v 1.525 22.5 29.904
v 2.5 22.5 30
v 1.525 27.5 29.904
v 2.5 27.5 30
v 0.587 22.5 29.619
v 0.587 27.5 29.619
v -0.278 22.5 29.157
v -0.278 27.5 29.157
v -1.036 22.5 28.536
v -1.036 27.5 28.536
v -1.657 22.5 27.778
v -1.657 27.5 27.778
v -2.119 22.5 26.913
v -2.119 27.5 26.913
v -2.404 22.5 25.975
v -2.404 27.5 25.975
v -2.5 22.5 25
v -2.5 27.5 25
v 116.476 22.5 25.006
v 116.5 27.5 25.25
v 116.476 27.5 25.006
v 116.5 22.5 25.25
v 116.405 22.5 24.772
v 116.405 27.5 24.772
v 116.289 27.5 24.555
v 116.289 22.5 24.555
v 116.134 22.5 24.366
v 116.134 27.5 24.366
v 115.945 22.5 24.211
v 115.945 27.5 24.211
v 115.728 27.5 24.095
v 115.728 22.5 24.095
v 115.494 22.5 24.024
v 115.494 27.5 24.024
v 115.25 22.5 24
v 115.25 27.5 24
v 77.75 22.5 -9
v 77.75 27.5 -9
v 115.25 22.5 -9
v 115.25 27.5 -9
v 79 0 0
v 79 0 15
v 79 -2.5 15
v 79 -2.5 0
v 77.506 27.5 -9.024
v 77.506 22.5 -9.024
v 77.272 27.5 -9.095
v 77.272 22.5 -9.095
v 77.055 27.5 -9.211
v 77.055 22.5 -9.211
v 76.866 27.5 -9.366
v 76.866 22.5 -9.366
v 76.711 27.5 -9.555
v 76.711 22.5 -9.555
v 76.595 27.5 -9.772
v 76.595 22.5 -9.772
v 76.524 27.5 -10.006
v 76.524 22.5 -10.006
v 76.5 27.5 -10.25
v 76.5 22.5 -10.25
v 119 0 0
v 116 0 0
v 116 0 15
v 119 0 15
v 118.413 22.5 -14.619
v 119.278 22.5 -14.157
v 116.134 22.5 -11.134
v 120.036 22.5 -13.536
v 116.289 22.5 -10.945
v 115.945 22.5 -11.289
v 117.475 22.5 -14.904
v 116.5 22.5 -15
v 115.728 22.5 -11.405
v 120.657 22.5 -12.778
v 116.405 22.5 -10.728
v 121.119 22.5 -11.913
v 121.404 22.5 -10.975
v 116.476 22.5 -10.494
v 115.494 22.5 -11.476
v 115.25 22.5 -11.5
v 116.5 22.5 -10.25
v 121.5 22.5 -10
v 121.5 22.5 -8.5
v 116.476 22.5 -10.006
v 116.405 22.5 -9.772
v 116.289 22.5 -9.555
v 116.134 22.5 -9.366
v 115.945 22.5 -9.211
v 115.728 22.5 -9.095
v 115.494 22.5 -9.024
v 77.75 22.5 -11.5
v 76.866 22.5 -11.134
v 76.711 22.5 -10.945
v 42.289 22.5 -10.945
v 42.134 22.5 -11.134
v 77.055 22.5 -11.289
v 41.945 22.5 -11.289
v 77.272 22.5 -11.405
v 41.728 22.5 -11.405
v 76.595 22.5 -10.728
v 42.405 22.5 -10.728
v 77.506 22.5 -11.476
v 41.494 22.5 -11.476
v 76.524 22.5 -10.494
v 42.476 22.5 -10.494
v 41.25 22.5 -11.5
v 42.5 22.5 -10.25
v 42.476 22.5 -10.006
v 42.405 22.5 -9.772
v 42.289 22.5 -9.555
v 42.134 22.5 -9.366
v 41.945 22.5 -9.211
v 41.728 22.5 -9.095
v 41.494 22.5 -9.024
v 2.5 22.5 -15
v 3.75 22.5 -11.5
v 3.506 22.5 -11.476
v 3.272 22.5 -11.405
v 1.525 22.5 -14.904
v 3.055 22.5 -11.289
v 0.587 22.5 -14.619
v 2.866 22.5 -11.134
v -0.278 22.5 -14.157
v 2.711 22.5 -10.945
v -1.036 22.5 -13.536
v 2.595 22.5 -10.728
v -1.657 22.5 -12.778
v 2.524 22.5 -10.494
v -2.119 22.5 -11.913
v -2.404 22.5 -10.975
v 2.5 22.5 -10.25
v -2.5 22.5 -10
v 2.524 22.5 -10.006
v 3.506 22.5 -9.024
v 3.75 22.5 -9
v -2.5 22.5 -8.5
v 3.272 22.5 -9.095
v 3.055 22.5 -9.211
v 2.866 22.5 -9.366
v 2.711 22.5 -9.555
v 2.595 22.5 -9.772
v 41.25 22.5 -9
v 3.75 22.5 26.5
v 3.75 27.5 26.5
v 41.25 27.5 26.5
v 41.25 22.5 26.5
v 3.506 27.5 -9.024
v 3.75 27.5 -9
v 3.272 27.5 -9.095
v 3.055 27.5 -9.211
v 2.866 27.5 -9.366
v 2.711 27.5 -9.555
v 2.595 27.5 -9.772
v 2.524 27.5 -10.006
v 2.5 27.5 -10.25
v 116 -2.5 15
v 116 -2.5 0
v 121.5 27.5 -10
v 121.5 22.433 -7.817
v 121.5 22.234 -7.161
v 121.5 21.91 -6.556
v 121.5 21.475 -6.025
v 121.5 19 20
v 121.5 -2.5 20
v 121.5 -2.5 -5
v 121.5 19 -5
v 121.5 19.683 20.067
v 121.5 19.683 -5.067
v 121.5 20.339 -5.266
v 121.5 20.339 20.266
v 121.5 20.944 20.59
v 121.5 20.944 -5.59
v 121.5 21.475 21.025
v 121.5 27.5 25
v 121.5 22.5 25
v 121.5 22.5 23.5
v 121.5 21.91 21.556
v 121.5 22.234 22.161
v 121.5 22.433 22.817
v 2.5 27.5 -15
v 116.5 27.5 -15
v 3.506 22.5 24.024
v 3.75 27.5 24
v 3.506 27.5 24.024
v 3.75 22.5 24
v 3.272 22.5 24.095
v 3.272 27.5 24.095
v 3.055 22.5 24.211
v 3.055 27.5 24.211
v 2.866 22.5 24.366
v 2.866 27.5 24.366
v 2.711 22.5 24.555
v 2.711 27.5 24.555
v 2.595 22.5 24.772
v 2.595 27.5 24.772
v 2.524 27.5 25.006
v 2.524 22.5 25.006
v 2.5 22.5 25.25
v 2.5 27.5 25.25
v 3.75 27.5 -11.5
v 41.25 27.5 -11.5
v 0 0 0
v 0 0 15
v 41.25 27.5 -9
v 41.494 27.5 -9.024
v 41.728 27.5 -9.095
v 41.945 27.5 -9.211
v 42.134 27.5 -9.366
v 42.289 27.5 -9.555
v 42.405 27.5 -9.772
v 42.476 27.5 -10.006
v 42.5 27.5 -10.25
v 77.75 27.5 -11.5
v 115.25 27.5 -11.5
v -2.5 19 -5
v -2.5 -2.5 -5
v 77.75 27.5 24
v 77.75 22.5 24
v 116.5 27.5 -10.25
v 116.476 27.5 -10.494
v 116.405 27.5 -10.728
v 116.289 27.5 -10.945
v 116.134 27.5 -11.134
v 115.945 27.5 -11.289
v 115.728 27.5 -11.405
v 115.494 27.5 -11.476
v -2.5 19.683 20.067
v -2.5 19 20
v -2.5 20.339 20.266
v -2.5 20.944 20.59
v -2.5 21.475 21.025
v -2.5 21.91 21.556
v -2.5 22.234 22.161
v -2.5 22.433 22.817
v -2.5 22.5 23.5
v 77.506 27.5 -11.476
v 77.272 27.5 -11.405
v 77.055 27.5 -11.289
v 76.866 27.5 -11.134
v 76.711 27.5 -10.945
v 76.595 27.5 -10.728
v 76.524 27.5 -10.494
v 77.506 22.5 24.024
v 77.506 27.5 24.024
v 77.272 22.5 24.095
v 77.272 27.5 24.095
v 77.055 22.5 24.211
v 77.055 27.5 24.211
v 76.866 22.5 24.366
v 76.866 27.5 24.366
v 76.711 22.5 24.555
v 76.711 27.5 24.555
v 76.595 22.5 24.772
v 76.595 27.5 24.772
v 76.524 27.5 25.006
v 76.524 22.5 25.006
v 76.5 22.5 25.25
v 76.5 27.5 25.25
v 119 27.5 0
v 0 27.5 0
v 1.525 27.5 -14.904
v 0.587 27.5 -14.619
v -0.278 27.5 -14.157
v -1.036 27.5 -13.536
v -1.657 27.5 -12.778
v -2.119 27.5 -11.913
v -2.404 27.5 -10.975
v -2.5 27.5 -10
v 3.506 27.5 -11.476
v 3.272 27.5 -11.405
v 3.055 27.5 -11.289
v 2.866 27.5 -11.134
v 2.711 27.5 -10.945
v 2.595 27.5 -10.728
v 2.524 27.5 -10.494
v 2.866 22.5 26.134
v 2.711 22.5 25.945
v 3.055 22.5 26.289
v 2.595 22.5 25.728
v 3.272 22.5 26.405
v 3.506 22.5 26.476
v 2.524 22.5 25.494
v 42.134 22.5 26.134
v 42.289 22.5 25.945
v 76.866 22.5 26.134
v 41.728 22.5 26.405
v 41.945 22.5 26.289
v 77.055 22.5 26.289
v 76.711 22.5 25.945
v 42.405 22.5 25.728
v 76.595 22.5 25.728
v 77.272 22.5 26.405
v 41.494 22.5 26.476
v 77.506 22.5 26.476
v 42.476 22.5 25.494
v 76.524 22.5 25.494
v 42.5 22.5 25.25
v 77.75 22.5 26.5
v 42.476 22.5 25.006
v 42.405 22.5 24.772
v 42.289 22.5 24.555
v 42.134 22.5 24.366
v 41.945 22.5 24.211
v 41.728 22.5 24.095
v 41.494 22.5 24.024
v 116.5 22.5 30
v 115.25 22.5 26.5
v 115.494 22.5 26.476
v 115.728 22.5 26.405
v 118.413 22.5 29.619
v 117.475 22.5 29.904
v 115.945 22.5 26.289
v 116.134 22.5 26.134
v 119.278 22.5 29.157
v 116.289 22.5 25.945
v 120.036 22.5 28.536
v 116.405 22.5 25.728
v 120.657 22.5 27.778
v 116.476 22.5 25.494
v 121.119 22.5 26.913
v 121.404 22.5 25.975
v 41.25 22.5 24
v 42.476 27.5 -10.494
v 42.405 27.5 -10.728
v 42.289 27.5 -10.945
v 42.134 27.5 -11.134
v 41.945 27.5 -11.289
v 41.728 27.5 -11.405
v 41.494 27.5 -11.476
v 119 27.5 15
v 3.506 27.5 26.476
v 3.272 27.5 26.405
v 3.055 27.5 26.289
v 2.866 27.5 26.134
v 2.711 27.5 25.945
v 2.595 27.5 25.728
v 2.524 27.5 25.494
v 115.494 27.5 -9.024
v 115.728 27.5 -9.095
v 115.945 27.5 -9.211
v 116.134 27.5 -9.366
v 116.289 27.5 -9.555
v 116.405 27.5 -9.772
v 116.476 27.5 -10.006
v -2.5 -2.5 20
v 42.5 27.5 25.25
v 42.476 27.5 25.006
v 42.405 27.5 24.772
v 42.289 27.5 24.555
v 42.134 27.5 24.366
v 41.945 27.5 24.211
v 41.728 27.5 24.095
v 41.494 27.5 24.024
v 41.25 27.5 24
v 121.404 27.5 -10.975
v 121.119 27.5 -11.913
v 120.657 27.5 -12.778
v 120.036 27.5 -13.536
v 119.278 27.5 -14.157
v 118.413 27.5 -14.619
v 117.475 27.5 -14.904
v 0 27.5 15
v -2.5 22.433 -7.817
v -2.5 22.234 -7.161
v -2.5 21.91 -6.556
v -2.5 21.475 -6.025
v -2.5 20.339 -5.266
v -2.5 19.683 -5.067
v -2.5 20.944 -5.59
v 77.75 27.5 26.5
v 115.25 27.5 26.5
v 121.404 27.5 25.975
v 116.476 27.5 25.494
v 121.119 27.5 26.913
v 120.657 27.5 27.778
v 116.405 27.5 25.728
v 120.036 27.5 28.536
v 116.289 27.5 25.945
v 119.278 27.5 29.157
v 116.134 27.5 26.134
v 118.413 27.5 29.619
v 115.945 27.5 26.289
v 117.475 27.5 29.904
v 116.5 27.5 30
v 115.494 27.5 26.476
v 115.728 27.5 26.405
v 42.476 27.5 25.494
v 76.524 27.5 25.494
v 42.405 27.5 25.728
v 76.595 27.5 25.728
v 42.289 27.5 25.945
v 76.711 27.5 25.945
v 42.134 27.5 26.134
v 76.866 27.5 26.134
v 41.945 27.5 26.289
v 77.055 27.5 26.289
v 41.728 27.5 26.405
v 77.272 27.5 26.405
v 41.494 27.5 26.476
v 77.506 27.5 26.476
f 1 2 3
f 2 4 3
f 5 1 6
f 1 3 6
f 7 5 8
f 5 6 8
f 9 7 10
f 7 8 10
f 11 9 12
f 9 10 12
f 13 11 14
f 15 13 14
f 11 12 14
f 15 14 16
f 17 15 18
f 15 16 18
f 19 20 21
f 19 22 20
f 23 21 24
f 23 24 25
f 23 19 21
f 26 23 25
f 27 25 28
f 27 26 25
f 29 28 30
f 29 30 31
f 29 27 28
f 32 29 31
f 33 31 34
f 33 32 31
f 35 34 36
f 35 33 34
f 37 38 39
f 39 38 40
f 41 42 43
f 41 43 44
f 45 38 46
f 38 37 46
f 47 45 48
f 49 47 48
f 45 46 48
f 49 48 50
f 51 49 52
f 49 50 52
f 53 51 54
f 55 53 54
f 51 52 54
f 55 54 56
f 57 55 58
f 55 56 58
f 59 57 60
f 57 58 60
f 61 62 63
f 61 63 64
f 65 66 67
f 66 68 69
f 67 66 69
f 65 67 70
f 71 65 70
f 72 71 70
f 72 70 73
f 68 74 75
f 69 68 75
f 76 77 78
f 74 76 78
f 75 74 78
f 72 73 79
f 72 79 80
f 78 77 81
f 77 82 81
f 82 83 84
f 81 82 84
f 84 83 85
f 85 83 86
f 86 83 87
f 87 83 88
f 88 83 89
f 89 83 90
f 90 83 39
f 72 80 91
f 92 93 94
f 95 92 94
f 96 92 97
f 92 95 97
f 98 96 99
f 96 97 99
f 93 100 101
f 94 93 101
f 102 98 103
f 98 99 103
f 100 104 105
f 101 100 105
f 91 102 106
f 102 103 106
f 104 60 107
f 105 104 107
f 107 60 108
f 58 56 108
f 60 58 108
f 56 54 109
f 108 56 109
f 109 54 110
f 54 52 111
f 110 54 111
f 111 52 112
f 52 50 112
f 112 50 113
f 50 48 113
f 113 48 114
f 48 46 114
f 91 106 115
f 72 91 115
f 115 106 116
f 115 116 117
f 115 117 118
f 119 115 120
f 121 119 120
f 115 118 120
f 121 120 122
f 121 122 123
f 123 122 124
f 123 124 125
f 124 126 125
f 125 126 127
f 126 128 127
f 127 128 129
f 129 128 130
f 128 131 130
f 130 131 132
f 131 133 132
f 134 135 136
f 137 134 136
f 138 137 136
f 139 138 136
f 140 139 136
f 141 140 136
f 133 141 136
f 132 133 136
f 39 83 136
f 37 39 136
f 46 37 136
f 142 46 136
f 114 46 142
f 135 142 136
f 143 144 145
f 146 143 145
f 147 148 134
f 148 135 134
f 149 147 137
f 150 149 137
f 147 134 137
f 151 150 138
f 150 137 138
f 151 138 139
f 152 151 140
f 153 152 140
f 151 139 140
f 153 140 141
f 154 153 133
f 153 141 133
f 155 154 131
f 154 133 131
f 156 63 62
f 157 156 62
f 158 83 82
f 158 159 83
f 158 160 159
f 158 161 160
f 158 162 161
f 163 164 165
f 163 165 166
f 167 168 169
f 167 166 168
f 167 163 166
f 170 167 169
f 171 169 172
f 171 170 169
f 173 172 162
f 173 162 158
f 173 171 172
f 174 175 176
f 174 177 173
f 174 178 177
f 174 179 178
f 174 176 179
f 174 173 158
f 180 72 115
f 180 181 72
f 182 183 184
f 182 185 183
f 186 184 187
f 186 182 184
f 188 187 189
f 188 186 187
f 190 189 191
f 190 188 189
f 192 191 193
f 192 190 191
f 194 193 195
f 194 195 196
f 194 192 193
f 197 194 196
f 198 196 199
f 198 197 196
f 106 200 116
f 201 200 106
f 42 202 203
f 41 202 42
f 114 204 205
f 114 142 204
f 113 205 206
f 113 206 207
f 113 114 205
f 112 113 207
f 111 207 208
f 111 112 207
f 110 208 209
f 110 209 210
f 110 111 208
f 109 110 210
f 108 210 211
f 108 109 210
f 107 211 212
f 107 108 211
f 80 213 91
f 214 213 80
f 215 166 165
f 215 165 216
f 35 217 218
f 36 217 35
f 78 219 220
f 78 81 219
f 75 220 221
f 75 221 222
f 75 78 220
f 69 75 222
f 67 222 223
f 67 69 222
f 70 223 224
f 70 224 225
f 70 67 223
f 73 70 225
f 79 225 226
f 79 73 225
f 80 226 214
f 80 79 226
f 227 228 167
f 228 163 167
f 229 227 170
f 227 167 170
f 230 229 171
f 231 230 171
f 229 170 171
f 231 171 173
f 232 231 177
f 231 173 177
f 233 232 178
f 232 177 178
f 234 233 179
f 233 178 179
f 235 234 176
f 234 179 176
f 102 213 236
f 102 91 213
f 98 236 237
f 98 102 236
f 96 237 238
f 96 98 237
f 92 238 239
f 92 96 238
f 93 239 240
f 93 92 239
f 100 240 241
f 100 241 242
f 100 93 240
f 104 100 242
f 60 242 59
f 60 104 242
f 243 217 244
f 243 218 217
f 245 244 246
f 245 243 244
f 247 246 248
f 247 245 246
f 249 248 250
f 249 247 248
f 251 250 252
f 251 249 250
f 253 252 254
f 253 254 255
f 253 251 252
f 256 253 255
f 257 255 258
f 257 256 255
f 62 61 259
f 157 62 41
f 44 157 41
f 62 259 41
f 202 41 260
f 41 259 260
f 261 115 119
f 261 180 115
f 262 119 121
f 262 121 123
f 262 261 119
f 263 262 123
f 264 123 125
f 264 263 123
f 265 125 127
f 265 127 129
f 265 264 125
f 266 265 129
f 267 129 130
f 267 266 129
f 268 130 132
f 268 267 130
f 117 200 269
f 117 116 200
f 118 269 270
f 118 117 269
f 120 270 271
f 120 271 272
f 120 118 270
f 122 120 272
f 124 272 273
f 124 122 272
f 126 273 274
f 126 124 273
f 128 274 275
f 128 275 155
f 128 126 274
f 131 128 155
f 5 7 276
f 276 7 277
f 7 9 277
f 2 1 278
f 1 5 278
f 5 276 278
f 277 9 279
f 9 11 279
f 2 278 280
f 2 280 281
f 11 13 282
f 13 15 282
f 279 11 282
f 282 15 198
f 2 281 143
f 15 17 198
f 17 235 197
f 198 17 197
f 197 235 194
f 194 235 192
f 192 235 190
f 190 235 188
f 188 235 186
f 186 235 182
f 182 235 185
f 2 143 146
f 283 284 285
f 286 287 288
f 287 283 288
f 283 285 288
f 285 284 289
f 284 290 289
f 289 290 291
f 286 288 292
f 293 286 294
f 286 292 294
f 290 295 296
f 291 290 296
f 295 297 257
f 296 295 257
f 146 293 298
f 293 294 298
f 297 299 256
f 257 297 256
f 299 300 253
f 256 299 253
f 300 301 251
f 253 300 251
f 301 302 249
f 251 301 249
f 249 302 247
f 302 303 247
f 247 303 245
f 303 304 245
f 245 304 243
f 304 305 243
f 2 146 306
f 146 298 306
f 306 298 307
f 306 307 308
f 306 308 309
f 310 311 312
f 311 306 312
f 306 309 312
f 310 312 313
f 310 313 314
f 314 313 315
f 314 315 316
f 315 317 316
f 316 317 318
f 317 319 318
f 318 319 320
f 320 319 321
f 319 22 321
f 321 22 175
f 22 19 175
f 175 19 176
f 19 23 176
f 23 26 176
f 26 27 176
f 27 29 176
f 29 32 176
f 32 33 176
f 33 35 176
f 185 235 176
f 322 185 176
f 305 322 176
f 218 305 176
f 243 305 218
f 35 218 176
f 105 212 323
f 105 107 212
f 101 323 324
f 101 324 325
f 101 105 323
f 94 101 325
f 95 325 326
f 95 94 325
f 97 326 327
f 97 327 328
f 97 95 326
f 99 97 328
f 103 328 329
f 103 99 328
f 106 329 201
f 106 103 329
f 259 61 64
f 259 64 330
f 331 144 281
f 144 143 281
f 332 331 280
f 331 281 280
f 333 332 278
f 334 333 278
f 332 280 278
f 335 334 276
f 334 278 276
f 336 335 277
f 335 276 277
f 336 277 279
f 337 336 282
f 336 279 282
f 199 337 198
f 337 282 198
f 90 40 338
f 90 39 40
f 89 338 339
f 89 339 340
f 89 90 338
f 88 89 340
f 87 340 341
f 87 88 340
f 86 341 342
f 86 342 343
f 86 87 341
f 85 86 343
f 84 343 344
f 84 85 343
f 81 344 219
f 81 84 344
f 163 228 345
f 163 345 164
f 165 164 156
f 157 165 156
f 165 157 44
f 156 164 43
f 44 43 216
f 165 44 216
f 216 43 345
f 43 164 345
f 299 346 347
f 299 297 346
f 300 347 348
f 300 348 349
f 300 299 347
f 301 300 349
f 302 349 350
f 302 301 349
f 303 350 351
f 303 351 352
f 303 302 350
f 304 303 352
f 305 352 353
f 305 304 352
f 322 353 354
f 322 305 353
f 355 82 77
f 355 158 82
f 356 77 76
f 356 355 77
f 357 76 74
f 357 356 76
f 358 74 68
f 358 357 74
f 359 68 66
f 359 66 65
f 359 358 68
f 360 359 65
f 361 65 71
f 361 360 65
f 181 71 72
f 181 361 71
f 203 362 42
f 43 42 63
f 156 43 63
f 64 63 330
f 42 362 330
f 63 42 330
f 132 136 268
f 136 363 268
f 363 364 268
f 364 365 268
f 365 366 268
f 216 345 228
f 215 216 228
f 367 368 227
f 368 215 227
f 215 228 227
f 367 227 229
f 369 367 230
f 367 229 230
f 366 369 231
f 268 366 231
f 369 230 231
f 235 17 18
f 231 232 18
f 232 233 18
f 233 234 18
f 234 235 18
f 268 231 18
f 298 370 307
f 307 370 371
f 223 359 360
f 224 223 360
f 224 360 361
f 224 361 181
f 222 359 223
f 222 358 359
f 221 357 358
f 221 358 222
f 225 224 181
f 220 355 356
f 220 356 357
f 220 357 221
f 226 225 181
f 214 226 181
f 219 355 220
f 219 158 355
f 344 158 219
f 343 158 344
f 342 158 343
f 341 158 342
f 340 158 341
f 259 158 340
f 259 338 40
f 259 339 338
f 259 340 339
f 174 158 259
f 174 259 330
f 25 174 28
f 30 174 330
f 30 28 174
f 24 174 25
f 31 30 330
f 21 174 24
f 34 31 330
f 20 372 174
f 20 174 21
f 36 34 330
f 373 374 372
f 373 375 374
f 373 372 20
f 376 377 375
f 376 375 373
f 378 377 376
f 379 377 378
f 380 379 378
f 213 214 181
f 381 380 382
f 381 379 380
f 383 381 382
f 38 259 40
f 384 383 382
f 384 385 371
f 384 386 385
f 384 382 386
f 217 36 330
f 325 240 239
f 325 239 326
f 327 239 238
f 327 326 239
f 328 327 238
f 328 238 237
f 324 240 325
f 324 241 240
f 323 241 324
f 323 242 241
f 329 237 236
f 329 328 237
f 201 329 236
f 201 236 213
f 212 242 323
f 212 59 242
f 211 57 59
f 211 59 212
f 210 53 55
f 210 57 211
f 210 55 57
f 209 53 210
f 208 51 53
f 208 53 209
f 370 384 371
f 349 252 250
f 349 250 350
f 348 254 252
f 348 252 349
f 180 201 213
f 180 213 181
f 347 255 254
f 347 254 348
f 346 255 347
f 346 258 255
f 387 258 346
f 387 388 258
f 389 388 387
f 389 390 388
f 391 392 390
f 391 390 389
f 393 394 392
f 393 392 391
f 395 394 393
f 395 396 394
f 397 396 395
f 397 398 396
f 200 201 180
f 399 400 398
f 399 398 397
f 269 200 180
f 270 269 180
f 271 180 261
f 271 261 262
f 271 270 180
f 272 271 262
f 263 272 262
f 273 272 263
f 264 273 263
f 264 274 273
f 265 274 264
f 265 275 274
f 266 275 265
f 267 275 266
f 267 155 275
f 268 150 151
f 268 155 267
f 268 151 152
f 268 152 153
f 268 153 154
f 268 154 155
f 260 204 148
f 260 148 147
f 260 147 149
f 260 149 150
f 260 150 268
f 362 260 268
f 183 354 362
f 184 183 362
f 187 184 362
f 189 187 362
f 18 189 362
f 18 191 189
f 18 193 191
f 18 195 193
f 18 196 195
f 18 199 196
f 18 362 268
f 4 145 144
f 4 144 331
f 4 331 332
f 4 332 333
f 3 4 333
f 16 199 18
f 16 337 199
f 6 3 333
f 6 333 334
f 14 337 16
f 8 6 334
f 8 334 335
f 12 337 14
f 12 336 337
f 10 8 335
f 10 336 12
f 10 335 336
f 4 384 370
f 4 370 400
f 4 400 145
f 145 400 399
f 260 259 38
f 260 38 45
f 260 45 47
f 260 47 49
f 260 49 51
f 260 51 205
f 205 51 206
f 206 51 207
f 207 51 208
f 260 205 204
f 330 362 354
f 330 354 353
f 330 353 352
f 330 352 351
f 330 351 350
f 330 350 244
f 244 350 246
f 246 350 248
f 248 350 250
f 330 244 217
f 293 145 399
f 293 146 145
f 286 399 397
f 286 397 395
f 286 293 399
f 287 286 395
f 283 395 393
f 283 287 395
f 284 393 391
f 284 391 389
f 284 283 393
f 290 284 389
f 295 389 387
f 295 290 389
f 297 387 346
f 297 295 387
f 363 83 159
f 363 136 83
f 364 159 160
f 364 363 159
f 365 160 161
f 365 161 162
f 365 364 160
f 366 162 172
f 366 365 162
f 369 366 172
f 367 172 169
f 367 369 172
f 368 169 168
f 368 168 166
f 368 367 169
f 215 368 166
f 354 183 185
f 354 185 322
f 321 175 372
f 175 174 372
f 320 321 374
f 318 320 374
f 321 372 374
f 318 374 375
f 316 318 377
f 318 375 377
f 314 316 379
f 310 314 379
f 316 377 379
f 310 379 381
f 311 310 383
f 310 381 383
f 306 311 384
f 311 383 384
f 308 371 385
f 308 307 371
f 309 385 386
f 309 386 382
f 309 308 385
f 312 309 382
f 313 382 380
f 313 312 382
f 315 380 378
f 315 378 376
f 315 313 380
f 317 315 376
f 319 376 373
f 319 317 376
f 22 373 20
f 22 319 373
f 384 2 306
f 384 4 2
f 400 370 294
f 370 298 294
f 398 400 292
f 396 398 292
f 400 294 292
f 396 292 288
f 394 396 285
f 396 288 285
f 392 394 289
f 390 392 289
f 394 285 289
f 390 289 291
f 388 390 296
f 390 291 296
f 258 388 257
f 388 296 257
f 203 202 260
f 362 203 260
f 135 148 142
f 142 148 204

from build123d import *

# Parameters (mm, degrees)
ESQUISSE1_W             = 124
ESQUISSE1_H             = 66
ESQUISSE1_W_2           = 119
ESQUISSE1_H_2           = 61
BOSS_EXTRU_1_DEPTH      = 15
ESQUISSE2_W             = 124
ESQUISSE2_H             = 30
BOSS_EXTRU_2_DEPTH      = 5
ESQUISSE3_W             = 124
ESQUISSE3_H             = 30
BOSS_EXTRU_3_DEPTH      = 5
ESQUISSE2_4_W           = 119
ESQUISSE2_4_H           = 33.5
ENL_V_MAT_EXTRU_2_DEPTH = 139.544216769
ESQUISSE4_W             = 124
ESQUISSE4_H             = 5
BOSS_EXTRU_4_DEPTH      = 10
ESQUISSE6_W             = 124
ESQUISSE6_H             = 5
BOSS_EXTRU_5_DEPTH      = 10
ESQUISSE5_W             = 40
ESQUISSE5_H             = 2.5
ENL_V_MAT_EXTRU_3_DEPTH = 10
CONG_5_R                = 5
CONG_6_R                = 3.5
CONG_7_R                = 1.25
ESQUISSE7_W             = 37
ESQUISSE7_H             = 15
ENL_V_MAT_EXTRU_4_DEPTH = 129.134694755


with BuildPart() as part:
    # Esquisse1 → Boss.-Extru.1 (new body)
    with BuildSketch(Plane.XY):
        with Locations((59.5, 30.5)):
            Rectangle(ESQUISSE1_W, ESQUISSE1_H)
        with Locations((59.5, 30.5)):
            Rectangle(ESQUISSE1_W_2, ESQUISSE1_H_2, mode=Mode.SUBTRACT)
    extrude(amount=BOSS_EXTRU_1_DEPTH)

    # Esquisse2 → Boss.-Extru.2 (add)
    with BuildSketch(Plane.XY.offset(15)):
        with Locations((59.5, 12.5)):
            Rectangle(ESQUISSE2_W, ESQUISSE2_H)
    extrude(amount=BOSS_EXTRU_2_DEPTH)

    # Esquisse3 → Boss.-Extru.3 (add)
    with BuildSketch(Plane(origin=(0, 0, 0), x_dir=(-1, 0, 0), z_dir=(0, 0, -1))):
        with Locations((-59.5, 12.5)):
            Rectangle(ESQUISSE3_W, ESQUISSE3_H)
    extrude(amount=BOSS_EXTRU_3_DEPTH)

    # Esquisse2<4> → Enlèv. mat.-Extru.2 (cut, through all)
    with BuildSketch(Plane.XY.offset(15)):
        Polygon((-2.5, 63.5), (-2.5, 27.5), (0, 27.5), (0, 61), (119, 61), (119, 27.5), (121.5, 27.5), (121.5, 63.5), align=None)
        with Locations((59.5, 44.25)):
            Rectangle(ESQUISSE2_4_W, ESQUISSE2_4_H)
        Polygon((-7.324686497, 27.5), (-2.5, 27.5), (-2.5, 63.5), (121.5, 63.5), (121.5, 27.5), (134.265191069, 27.5), (134.265191069, 70.183408252), (-7.324686497, 70.183408252), align=None)
    extrude(amount=-ENL_V_MAT_EXTRU_2_DEPTH, mode=Mode.SUBTRACT)

    # Esquisse4 → Boss.-Extru.4 (add)
    with BuildSketch(Plane.XY.offset(20)):
        with Locations((59.5, 25)):
            Rectangle(ESQUISSE4_W, ESQUISSE4_H)
    extrude(amount=BOSS_EXTRU_4_DEPTH)

    # Esquisse6 → Boss.-Extru.5 (add)
    with BuildSketch(Plane(origin=(0, 0, -5), x_dir=(-1, 0, 0), z_dir=(0, 0, -1))):
        with Locations((-59.5, 25)):
            Rectangle(ESQUISSE6_W, ESQUISSE6_H)
    extrude(amount=BOSS_EXTRU_5_DEPTH)

    # Esquisse5 → Enlèv. mat.-Extru.3 (cut)
    with BuildSketch(Plane(origin=(0, 27.5, 0), x_dir=(1, 0, 0), z_dir=(0, 1, 0))):
        with Locations((22.5, -25.25)):
            Rectangle(ESQUISSE5_W, ESQUISSE5_H)
        with Locations((96.5, -25.25)):
            Rectangle(ESQUISSE5_W, ESQUISSE5_H)
        with Locations((22.5, 10.25)):
            Rectangle(ESQUISSE5_W, ESQUISSE5_H)
        with Locations((96.5, 10.25)):
            Rectangle(ESQUISSE5_W, ESQUISSE5_H)
    extrude(amount=-ENL_V_MAT_EXTRU_3_DEPTH, mode=Mode.SUBTRACT)

    # Congé5
    cong_5_edges = [part.edges().sort_by_distance(p)[0] for p in [
        (121.5, 25, 30),
        (121.5, 25, -15),
        (-2.5, 25, -15),
        (-2.5, 25, 30),
    ]]
    fillet(cong_5_edges, radius=CONG_5_R)

    # Congé6
    cong_6_edges = [part.edges().sort_by_distance(p)[0] for p in [
        (59.5, 22.5, 20),
        (59.5, 22.5, -5),
    ]]
    fillet(cong_6_edges, radius=CONG_6_R)

    # Congé7
    cong_7_edges = [part.edges().sort_by_distance(p)[0] for p in [
        (76.5, 25, -11.5),
        (76.5, 25, -9),
        (116.5, 25, -9),
        (116.5, 25, -11.5),
        (42.5, 25, -11.5),
        (42.5, 25, -9),
        (2.5, 25, -11.5),
        (2.5, 25, -9),
        (2.5, 25, 24),
        (2.5, 25, 26.5),
        (42.5, 25, 24),
        (42.5, 25, 26.5),
        (76.5, 25, 24),
        (76.5, 25, 26.5),
        (116.5, 25, 24),
        (116.5, 25, 26.5),
    ]]
    fillet(cong_7_edges, radius=CONG_7_R - 0.0001)  # a hair under: the kernel refuses the full size

    # Esquisse7 → Enlèv. mat.-Extru.4 (cut, through all)
    with BuildSketch(Plane(origin=(0, 0, 0), x_dir=(1, 0, 0), z_dir=(0, 1, 0))):
        with Locations((97.5, -7.5)):
            Rectangle(ESQUISSE7_W, ESQUISSE7_H)
    extrude(amount=-ENL_V_MAT_EXTRU_4_DEPTH, mode=Mode.SUBTRACT)


solid = part.part
